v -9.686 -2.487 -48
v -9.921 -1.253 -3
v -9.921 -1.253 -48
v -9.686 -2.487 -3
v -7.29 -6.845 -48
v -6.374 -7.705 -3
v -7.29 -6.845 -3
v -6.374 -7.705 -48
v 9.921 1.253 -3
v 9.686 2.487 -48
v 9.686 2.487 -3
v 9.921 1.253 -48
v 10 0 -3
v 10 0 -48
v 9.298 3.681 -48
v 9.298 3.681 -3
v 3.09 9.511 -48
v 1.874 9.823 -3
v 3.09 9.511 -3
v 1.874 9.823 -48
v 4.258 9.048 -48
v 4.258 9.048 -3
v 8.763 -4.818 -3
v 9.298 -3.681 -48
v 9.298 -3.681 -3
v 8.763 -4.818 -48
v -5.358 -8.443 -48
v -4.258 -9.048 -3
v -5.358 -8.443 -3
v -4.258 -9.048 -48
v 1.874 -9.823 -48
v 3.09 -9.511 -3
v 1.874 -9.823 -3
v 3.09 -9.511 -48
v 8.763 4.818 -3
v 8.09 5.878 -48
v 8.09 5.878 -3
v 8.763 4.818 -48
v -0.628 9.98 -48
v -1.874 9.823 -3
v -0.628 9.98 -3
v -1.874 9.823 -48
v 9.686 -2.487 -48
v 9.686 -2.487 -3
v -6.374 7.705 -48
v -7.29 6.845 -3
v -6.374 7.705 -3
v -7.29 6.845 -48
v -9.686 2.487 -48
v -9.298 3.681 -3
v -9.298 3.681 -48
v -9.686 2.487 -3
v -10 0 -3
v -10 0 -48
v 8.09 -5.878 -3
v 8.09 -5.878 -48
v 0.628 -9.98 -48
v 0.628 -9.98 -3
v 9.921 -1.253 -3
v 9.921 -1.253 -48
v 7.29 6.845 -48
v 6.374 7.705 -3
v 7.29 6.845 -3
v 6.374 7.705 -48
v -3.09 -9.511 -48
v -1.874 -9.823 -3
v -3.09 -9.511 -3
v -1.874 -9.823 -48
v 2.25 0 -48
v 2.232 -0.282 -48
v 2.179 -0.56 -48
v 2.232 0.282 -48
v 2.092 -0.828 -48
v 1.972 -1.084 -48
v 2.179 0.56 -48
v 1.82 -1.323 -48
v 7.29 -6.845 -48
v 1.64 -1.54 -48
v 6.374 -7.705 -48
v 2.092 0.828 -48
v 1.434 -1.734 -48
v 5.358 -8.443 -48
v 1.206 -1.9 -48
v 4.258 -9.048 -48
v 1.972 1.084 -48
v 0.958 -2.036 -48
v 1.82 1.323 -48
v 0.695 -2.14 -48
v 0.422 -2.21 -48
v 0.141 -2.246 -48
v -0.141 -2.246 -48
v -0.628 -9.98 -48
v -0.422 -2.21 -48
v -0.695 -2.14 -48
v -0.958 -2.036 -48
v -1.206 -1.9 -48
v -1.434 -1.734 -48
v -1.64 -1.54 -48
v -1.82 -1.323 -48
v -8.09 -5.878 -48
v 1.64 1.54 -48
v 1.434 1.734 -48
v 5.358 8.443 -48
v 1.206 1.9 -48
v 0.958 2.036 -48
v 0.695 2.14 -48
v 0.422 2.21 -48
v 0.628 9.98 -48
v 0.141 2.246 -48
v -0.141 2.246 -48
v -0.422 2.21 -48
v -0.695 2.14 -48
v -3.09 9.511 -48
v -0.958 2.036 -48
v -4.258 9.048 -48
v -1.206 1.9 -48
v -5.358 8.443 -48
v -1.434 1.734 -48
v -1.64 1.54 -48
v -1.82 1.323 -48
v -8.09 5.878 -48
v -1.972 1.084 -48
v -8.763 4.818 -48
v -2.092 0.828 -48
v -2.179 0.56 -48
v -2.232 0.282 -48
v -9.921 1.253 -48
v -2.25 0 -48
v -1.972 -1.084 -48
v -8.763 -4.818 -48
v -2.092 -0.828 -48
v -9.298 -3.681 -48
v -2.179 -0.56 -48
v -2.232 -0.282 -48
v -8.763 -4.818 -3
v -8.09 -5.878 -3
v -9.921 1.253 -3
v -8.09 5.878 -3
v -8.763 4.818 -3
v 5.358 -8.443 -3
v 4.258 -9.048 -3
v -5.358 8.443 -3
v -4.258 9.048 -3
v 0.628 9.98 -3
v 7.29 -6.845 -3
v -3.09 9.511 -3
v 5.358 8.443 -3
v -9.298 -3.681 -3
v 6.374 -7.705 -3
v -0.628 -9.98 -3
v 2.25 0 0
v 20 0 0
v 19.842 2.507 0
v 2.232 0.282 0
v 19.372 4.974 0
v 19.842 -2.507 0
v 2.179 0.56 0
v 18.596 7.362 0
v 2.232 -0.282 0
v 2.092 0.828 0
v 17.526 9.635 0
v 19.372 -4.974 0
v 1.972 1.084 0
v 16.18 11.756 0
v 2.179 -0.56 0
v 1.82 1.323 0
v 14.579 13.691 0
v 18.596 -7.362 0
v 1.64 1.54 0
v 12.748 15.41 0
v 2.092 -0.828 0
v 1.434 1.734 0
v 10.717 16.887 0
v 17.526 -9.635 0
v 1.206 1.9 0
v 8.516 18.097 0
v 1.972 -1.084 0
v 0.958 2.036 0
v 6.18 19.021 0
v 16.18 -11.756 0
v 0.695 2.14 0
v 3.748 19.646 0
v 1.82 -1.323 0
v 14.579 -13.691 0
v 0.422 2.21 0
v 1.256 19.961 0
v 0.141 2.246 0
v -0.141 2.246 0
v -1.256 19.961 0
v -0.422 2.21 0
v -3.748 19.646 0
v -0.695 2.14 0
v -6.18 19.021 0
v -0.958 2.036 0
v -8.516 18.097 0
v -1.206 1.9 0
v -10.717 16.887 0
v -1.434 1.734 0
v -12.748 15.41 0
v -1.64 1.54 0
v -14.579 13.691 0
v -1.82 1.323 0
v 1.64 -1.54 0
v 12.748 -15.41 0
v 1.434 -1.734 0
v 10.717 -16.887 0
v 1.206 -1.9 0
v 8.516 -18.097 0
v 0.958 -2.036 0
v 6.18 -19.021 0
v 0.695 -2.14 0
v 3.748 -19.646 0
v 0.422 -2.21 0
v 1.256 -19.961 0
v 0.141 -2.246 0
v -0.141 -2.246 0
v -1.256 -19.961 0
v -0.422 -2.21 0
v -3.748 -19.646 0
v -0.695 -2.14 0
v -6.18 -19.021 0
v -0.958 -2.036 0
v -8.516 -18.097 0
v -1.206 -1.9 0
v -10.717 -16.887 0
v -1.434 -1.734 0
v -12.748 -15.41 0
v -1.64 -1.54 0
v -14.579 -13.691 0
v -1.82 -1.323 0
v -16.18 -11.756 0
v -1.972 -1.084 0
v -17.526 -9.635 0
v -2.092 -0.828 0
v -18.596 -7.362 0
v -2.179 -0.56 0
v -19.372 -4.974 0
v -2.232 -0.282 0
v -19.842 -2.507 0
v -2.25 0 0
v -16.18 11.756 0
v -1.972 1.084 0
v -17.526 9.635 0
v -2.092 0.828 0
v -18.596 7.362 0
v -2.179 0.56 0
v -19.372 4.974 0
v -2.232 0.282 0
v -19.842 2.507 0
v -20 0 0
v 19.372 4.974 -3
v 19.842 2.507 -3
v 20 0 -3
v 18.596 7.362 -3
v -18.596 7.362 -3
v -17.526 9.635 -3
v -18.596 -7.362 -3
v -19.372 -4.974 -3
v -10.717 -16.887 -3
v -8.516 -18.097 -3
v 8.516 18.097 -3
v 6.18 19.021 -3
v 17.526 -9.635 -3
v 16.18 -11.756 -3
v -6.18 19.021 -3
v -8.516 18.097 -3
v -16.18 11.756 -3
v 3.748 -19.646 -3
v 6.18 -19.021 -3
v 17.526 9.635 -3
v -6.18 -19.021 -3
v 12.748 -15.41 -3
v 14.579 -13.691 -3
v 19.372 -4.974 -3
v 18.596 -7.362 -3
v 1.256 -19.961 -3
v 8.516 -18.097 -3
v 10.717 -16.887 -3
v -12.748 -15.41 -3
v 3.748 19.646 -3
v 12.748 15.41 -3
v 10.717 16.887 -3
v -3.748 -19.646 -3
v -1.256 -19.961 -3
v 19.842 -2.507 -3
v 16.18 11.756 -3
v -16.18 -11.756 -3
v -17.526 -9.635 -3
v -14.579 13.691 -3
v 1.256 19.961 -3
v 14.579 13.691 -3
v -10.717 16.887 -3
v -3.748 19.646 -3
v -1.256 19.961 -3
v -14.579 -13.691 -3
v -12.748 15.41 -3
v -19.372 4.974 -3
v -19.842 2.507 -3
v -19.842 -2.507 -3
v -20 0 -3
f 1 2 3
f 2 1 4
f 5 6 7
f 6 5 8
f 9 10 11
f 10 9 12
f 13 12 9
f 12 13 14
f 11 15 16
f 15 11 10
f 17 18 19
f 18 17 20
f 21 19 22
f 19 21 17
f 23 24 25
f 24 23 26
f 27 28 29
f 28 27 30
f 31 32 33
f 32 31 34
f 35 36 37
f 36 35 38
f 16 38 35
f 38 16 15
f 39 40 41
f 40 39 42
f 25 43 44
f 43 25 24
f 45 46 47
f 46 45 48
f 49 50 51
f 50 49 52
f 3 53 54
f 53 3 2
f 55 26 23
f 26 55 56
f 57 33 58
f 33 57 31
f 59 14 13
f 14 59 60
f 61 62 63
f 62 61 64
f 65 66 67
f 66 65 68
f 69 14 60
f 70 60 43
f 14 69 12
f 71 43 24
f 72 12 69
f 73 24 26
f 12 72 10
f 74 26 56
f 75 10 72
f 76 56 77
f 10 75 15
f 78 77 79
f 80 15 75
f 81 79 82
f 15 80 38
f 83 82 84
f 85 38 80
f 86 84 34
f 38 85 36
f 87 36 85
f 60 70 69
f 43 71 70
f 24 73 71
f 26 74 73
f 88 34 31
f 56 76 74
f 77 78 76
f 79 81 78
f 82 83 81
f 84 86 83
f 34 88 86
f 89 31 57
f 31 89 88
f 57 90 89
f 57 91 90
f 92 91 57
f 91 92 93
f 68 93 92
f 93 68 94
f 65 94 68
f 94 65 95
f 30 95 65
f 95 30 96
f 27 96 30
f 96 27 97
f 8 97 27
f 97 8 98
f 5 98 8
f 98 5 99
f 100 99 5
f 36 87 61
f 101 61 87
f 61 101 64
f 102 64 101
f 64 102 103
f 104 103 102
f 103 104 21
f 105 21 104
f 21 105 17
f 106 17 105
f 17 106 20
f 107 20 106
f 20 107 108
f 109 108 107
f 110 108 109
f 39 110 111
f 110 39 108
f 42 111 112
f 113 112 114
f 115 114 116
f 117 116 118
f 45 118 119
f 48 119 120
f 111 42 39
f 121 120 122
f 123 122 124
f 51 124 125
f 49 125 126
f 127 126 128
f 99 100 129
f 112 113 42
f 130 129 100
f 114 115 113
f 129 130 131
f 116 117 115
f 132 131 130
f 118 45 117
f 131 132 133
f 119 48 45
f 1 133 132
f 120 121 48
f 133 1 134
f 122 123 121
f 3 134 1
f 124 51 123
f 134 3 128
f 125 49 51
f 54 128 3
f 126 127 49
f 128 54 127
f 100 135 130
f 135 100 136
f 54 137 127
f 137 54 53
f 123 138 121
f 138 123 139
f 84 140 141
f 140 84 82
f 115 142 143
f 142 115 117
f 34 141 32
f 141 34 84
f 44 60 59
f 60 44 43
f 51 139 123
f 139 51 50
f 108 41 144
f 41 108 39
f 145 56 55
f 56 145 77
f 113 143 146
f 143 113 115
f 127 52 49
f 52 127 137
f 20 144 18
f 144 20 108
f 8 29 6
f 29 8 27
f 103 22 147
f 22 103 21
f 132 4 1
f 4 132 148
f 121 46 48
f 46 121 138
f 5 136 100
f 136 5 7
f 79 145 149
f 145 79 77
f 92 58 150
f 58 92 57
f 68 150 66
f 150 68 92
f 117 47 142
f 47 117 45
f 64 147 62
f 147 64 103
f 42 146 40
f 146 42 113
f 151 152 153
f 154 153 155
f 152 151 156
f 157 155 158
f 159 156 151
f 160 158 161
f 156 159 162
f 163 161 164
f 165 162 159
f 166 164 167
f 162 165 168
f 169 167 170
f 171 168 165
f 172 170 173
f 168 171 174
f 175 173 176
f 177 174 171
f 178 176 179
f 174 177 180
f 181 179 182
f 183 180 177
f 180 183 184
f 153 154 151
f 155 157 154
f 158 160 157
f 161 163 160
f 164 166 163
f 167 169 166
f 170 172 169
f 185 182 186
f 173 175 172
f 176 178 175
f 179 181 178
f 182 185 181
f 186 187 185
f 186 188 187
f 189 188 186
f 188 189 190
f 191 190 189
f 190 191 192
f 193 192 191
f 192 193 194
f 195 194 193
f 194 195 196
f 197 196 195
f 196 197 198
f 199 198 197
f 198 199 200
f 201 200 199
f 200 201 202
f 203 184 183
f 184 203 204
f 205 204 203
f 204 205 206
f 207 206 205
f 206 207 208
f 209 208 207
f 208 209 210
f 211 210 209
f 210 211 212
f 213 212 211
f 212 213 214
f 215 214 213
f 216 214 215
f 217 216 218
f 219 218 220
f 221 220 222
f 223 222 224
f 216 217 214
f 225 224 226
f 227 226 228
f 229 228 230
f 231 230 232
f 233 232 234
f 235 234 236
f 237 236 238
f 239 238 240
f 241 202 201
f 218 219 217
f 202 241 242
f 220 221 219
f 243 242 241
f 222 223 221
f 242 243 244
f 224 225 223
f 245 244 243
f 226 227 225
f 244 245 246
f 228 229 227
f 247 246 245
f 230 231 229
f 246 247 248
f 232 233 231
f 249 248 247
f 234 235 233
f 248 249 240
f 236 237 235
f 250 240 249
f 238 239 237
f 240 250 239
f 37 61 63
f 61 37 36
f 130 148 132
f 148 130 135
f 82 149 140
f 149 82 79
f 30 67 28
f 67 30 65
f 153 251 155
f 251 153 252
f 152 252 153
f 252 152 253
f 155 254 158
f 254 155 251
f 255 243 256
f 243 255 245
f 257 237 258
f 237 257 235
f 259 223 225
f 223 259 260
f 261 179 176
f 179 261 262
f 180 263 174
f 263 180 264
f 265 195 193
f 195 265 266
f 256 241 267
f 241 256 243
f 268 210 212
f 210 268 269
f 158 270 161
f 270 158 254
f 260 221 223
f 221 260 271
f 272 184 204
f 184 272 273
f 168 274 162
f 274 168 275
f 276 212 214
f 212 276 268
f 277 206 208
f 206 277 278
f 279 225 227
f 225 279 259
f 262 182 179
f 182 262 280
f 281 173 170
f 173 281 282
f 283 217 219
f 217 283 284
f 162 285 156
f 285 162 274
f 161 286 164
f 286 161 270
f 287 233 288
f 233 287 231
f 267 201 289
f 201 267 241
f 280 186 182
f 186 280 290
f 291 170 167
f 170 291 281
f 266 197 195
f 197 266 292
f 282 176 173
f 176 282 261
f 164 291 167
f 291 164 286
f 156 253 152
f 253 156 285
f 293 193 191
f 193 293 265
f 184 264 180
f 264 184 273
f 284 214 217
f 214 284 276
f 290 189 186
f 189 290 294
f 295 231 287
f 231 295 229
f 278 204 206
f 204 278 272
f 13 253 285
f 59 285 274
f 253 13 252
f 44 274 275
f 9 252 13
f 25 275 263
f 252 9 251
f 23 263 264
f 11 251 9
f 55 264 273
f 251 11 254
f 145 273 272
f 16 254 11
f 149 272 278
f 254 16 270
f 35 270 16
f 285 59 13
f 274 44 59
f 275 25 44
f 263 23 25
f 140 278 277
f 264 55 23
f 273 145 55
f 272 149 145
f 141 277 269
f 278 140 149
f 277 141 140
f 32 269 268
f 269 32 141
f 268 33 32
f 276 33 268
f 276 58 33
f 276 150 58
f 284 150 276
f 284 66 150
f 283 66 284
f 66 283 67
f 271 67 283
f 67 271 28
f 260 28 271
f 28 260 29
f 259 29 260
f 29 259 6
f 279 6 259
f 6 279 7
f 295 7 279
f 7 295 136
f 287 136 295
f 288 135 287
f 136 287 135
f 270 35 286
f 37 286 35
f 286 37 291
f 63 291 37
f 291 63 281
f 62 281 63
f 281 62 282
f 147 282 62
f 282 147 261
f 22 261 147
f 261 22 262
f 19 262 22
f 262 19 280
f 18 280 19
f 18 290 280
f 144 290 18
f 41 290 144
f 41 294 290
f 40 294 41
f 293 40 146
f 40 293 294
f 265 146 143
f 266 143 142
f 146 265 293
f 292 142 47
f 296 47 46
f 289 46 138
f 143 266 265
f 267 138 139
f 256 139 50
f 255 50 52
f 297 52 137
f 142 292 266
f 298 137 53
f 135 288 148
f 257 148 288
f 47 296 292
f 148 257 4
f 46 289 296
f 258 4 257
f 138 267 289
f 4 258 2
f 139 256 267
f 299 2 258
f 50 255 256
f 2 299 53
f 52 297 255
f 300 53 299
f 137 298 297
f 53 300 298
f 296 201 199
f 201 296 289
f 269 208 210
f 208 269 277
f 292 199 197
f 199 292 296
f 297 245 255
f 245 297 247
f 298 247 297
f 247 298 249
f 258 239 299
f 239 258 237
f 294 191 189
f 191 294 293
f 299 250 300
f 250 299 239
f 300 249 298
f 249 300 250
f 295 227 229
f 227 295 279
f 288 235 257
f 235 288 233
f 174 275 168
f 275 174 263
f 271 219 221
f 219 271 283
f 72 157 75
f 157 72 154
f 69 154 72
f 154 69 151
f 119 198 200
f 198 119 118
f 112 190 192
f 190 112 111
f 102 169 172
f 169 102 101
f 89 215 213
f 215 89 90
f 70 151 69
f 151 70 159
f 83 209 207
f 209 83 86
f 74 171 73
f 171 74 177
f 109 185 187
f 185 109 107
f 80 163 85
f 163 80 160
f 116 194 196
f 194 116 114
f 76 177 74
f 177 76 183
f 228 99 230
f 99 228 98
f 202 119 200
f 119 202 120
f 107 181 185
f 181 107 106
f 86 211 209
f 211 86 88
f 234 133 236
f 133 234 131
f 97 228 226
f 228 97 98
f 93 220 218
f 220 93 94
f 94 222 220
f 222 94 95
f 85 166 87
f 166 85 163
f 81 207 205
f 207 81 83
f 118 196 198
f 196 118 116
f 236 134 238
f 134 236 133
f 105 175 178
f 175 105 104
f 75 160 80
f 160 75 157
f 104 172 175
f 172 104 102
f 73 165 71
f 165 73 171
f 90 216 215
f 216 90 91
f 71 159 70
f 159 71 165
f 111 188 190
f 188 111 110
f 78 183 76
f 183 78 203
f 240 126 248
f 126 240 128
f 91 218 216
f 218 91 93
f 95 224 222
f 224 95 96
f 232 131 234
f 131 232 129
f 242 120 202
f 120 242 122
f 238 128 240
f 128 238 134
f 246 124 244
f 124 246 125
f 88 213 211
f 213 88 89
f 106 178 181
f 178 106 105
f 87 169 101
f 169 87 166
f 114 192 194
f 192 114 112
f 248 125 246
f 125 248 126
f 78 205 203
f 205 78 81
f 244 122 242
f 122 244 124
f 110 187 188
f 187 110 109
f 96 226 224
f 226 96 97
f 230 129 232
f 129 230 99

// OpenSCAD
$fn = 50;


difference() {
	union() {
		translate(v = [0, 0, -48.0000000000]) {
			cylinder(h = 48, r = 10.0000000000);
		}
		translate(v = [0, 0, -3.0000000000]) {
			cylinder(h = 3, r = 20.0000000000);
		}
	}
	union() {
		#translate(v = [0, 0, -48]) {
			cylinder(h = 48, r = 2.2500000000);
		}
	}
}
